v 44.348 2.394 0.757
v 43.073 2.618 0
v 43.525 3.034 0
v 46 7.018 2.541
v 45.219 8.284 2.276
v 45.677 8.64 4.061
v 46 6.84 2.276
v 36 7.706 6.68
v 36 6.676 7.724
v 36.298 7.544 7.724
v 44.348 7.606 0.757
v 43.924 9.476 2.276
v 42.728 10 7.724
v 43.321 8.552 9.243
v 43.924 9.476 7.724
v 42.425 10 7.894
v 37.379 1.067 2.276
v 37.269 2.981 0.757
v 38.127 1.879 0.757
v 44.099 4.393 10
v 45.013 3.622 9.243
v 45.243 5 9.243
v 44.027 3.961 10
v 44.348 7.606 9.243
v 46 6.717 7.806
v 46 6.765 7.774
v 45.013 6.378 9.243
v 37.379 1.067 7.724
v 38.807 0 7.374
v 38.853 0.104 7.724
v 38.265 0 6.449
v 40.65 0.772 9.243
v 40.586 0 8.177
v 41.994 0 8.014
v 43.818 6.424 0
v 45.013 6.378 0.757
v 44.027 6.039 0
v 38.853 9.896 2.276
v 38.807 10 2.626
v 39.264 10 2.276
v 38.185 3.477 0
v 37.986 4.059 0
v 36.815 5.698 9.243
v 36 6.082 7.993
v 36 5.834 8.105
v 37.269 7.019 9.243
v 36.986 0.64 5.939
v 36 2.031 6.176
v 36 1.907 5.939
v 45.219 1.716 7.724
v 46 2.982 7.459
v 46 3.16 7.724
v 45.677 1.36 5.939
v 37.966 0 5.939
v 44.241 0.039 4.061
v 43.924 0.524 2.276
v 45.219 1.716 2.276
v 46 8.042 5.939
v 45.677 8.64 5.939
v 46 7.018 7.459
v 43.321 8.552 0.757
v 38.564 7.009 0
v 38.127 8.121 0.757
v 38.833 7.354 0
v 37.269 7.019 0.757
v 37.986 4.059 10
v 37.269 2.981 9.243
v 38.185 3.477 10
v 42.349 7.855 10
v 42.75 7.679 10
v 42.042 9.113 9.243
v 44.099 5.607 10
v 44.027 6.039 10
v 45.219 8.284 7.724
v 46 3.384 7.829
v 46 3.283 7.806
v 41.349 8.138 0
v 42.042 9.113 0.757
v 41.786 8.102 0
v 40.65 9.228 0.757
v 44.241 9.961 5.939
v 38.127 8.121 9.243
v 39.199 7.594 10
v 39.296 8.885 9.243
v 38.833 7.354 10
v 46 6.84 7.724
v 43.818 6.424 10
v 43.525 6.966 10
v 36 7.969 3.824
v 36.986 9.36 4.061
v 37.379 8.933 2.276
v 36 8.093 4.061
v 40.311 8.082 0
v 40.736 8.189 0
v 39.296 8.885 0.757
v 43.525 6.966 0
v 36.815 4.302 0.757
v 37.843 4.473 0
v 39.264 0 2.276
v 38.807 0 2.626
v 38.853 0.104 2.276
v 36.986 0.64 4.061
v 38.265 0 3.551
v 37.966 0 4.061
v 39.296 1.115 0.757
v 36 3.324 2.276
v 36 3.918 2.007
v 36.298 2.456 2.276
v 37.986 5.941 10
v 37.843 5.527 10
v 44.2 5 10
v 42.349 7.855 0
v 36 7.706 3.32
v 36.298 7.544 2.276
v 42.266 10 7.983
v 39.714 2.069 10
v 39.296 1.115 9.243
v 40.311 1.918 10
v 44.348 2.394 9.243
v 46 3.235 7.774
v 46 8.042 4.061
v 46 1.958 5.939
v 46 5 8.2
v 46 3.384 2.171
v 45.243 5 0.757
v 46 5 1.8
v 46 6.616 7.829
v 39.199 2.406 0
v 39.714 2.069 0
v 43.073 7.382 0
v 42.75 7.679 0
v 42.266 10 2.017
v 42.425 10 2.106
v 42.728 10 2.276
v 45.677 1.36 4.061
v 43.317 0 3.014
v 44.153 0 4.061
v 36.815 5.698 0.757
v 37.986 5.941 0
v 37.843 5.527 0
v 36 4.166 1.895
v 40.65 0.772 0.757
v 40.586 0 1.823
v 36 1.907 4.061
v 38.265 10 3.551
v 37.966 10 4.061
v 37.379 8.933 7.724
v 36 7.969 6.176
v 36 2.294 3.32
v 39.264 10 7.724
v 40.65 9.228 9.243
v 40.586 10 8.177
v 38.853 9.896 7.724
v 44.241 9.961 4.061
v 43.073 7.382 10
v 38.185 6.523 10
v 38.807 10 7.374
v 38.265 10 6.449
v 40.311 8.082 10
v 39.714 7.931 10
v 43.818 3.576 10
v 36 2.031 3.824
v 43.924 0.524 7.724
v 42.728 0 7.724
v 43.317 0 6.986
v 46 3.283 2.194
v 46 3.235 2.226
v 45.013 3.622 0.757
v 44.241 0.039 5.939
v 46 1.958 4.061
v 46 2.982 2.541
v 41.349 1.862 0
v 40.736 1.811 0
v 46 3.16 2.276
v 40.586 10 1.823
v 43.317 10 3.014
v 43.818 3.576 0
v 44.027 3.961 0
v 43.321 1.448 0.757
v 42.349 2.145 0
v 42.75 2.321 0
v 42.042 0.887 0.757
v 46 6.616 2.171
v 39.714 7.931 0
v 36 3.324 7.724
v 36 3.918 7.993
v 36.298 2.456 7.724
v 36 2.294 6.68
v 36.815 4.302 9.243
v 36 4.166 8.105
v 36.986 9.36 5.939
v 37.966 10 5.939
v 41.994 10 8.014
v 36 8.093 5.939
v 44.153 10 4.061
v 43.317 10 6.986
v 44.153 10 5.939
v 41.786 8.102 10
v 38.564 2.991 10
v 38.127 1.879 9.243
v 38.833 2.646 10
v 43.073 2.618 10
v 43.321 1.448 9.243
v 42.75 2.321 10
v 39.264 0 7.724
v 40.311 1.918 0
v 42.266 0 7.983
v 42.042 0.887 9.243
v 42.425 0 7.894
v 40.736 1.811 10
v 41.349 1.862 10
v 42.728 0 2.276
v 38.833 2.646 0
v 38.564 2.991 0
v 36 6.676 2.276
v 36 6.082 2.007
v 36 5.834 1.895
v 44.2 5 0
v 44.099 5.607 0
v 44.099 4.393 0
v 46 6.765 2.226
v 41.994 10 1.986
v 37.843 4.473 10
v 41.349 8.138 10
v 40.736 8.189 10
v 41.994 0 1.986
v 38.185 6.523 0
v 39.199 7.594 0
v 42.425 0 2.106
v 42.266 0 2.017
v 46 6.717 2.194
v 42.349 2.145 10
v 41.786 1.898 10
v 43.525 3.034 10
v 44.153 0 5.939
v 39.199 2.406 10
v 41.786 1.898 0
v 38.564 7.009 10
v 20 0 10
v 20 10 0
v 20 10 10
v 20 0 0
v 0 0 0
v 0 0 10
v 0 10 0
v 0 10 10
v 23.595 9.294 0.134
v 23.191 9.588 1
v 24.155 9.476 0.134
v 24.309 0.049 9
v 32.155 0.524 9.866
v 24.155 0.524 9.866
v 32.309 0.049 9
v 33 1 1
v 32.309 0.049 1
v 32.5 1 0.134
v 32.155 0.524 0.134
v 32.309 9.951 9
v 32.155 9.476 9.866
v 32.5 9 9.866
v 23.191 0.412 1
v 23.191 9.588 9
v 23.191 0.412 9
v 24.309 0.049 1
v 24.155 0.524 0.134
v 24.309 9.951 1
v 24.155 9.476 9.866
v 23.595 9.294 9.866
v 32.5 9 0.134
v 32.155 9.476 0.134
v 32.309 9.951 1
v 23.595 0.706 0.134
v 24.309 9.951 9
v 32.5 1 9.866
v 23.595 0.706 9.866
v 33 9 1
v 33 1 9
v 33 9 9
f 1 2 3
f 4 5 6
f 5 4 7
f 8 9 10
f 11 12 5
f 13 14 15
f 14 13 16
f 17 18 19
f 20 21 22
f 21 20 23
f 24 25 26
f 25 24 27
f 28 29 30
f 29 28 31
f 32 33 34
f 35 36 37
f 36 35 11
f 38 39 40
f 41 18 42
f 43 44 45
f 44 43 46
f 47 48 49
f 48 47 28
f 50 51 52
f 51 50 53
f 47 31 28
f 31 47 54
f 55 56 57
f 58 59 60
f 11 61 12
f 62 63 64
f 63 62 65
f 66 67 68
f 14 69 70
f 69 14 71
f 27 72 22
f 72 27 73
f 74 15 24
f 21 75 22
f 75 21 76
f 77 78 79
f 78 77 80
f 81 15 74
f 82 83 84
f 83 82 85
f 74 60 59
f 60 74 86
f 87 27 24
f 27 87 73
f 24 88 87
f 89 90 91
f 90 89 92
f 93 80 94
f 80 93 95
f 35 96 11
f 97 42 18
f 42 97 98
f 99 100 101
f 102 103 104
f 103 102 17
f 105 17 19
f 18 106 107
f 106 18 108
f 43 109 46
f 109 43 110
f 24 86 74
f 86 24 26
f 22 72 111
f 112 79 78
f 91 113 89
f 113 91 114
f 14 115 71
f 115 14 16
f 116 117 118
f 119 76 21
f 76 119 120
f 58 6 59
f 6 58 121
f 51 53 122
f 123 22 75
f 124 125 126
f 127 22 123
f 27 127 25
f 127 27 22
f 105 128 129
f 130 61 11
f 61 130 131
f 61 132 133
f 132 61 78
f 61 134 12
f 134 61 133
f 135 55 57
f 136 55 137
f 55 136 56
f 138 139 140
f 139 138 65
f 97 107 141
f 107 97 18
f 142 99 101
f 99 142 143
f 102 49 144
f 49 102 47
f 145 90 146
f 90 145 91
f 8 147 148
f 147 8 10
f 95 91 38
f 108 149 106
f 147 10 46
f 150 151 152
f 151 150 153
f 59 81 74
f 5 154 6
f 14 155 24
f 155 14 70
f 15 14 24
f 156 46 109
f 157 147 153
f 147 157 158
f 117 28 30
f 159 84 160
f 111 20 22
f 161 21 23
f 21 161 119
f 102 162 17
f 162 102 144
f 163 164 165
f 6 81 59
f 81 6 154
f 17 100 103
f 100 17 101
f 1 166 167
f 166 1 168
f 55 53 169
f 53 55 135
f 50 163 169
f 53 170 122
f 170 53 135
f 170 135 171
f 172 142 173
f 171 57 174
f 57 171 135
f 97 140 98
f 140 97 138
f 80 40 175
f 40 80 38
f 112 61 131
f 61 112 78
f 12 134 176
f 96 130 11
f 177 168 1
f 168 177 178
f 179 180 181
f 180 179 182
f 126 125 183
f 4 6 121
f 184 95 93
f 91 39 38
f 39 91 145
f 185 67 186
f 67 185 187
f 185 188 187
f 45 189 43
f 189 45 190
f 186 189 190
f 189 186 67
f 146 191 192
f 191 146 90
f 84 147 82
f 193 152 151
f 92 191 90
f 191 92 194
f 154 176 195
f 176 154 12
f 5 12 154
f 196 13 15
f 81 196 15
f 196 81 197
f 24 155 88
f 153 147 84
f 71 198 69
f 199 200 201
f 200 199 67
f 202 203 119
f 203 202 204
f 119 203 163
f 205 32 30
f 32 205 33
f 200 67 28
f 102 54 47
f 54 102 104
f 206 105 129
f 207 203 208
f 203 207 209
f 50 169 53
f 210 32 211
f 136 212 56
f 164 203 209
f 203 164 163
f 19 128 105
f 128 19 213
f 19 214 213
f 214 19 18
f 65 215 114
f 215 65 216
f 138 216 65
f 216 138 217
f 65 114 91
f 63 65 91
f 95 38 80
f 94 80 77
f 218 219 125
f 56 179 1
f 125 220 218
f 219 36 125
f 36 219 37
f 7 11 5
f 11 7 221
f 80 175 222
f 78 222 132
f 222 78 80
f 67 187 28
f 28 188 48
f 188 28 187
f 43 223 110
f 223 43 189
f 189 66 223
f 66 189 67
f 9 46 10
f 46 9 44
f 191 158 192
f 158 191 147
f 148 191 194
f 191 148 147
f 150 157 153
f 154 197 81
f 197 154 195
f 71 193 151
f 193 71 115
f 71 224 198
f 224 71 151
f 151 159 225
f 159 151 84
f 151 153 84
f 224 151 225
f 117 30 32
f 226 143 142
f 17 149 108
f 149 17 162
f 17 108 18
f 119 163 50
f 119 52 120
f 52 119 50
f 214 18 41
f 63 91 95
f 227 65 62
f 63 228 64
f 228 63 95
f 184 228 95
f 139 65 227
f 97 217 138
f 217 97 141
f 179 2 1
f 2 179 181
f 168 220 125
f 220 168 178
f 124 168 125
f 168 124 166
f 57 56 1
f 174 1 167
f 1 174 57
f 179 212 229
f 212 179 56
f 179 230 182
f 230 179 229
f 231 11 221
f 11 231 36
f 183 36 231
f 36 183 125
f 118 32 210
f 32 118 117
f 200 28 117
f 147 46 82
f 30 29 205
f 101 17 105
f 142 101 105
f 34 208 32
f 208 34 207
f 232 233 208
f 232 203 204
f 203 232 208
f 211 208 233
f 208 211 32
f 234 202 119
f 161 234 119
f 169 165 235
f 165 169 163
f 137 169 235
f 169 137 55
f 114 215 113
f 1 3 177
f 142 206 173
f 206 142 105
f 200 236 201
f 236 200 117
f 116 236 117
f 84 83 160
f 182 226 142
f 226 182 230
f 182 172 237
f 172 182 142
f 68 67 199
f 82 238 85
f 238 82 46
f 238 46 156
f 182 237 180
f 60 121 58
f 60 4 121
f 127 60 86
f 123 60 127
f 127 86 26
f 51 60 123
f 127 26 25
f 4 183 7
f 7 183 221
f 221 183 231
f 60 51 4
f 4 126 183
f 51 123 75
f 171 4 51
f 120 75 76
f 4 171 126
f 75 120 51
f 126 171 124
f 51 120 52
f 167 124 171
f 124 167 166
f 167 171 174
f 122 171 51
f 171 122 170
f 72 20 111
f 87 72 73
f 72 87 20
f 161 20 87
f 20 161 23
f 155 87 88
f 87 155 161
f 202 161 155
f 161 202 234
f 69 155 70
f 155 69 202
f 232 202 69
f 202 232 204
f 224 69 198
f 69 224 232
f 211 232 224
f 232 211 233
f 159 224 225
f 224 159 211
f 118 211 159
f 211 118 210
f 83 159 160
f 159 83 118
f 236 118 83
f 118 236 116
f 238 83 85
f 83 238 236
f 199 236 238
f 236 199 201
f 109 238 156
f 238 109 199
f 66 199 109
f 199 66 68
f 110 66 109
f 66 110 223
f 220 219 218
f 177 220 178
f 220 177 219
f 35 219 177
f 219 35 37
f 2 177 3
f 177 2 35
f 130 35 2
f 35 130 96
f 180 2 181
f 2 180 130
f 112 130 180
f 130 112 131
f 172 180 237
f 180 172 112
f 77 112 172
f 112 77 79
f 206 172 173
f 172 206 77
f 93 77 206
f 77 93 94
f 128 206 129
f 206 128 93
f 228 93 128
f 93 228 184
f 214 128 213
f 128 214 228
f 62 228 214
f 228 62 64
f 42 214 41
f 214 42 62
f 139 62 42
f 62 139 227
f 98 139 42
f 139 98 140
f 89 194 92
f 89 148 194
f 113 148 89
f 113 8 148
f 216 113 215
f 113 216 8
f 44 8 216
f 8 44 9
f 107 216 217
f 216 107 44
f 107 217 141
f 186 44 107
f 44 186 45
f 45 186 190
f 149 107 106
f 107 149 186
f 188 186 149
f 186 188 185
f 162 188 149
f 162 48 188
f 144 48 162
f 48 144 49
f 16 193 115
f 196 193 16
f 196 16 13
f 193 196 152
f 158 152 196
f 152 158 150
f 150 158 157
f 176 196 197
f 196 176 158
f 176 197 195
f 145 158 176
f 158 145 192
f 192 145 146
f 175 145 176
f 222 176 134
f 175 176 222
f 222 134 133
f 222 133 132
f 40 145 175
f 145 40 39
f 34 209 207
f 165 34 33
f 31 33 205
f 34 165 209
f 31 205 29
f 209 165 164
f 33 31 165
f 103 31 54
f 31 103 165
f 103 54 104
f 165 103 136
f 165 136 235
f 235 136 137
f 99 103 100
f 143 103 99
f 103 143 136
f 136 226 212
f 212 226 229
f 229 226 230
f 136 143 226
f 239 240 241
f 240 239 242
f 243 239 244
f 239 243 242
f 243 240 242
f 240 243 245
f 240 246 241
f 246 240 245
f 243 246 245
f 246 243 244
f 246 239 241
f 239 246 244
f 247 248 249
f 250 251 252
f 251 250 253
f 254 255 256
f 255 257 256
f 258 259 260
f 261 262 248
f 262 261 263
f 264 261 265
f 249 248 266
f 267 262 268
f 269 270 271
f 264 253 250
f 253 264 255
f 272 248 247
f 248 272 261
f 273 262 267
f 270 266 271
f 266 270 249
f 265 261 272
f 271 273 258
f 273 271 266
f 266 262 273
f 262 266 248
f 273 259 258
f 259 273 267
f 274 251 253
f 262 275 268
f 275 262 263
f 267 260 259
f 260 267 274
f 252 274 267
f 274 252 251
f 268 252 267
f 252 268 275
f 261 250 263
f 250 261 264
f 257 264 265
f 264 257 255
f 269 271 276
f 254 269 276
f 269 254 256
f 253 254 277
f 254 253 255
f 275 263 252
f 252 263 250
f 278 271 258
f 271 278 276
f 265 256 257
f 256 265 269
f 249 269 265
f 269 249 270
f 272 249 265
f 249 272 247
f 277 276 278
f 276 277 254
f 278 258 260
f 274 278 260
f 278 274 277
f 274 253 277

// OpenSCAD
color("red") hull() {
  cube(10);
  translate([10,0,0]) cube(10);
}
translate ([24,1,1]) color("green") minkowski() {
    cube(8);
    sphere(1);
  }
translate([41,5,5]) color("blue") resize() {
  intersection() {  
    sphere(r=6);
    cube(10, center=true);
  }
}
